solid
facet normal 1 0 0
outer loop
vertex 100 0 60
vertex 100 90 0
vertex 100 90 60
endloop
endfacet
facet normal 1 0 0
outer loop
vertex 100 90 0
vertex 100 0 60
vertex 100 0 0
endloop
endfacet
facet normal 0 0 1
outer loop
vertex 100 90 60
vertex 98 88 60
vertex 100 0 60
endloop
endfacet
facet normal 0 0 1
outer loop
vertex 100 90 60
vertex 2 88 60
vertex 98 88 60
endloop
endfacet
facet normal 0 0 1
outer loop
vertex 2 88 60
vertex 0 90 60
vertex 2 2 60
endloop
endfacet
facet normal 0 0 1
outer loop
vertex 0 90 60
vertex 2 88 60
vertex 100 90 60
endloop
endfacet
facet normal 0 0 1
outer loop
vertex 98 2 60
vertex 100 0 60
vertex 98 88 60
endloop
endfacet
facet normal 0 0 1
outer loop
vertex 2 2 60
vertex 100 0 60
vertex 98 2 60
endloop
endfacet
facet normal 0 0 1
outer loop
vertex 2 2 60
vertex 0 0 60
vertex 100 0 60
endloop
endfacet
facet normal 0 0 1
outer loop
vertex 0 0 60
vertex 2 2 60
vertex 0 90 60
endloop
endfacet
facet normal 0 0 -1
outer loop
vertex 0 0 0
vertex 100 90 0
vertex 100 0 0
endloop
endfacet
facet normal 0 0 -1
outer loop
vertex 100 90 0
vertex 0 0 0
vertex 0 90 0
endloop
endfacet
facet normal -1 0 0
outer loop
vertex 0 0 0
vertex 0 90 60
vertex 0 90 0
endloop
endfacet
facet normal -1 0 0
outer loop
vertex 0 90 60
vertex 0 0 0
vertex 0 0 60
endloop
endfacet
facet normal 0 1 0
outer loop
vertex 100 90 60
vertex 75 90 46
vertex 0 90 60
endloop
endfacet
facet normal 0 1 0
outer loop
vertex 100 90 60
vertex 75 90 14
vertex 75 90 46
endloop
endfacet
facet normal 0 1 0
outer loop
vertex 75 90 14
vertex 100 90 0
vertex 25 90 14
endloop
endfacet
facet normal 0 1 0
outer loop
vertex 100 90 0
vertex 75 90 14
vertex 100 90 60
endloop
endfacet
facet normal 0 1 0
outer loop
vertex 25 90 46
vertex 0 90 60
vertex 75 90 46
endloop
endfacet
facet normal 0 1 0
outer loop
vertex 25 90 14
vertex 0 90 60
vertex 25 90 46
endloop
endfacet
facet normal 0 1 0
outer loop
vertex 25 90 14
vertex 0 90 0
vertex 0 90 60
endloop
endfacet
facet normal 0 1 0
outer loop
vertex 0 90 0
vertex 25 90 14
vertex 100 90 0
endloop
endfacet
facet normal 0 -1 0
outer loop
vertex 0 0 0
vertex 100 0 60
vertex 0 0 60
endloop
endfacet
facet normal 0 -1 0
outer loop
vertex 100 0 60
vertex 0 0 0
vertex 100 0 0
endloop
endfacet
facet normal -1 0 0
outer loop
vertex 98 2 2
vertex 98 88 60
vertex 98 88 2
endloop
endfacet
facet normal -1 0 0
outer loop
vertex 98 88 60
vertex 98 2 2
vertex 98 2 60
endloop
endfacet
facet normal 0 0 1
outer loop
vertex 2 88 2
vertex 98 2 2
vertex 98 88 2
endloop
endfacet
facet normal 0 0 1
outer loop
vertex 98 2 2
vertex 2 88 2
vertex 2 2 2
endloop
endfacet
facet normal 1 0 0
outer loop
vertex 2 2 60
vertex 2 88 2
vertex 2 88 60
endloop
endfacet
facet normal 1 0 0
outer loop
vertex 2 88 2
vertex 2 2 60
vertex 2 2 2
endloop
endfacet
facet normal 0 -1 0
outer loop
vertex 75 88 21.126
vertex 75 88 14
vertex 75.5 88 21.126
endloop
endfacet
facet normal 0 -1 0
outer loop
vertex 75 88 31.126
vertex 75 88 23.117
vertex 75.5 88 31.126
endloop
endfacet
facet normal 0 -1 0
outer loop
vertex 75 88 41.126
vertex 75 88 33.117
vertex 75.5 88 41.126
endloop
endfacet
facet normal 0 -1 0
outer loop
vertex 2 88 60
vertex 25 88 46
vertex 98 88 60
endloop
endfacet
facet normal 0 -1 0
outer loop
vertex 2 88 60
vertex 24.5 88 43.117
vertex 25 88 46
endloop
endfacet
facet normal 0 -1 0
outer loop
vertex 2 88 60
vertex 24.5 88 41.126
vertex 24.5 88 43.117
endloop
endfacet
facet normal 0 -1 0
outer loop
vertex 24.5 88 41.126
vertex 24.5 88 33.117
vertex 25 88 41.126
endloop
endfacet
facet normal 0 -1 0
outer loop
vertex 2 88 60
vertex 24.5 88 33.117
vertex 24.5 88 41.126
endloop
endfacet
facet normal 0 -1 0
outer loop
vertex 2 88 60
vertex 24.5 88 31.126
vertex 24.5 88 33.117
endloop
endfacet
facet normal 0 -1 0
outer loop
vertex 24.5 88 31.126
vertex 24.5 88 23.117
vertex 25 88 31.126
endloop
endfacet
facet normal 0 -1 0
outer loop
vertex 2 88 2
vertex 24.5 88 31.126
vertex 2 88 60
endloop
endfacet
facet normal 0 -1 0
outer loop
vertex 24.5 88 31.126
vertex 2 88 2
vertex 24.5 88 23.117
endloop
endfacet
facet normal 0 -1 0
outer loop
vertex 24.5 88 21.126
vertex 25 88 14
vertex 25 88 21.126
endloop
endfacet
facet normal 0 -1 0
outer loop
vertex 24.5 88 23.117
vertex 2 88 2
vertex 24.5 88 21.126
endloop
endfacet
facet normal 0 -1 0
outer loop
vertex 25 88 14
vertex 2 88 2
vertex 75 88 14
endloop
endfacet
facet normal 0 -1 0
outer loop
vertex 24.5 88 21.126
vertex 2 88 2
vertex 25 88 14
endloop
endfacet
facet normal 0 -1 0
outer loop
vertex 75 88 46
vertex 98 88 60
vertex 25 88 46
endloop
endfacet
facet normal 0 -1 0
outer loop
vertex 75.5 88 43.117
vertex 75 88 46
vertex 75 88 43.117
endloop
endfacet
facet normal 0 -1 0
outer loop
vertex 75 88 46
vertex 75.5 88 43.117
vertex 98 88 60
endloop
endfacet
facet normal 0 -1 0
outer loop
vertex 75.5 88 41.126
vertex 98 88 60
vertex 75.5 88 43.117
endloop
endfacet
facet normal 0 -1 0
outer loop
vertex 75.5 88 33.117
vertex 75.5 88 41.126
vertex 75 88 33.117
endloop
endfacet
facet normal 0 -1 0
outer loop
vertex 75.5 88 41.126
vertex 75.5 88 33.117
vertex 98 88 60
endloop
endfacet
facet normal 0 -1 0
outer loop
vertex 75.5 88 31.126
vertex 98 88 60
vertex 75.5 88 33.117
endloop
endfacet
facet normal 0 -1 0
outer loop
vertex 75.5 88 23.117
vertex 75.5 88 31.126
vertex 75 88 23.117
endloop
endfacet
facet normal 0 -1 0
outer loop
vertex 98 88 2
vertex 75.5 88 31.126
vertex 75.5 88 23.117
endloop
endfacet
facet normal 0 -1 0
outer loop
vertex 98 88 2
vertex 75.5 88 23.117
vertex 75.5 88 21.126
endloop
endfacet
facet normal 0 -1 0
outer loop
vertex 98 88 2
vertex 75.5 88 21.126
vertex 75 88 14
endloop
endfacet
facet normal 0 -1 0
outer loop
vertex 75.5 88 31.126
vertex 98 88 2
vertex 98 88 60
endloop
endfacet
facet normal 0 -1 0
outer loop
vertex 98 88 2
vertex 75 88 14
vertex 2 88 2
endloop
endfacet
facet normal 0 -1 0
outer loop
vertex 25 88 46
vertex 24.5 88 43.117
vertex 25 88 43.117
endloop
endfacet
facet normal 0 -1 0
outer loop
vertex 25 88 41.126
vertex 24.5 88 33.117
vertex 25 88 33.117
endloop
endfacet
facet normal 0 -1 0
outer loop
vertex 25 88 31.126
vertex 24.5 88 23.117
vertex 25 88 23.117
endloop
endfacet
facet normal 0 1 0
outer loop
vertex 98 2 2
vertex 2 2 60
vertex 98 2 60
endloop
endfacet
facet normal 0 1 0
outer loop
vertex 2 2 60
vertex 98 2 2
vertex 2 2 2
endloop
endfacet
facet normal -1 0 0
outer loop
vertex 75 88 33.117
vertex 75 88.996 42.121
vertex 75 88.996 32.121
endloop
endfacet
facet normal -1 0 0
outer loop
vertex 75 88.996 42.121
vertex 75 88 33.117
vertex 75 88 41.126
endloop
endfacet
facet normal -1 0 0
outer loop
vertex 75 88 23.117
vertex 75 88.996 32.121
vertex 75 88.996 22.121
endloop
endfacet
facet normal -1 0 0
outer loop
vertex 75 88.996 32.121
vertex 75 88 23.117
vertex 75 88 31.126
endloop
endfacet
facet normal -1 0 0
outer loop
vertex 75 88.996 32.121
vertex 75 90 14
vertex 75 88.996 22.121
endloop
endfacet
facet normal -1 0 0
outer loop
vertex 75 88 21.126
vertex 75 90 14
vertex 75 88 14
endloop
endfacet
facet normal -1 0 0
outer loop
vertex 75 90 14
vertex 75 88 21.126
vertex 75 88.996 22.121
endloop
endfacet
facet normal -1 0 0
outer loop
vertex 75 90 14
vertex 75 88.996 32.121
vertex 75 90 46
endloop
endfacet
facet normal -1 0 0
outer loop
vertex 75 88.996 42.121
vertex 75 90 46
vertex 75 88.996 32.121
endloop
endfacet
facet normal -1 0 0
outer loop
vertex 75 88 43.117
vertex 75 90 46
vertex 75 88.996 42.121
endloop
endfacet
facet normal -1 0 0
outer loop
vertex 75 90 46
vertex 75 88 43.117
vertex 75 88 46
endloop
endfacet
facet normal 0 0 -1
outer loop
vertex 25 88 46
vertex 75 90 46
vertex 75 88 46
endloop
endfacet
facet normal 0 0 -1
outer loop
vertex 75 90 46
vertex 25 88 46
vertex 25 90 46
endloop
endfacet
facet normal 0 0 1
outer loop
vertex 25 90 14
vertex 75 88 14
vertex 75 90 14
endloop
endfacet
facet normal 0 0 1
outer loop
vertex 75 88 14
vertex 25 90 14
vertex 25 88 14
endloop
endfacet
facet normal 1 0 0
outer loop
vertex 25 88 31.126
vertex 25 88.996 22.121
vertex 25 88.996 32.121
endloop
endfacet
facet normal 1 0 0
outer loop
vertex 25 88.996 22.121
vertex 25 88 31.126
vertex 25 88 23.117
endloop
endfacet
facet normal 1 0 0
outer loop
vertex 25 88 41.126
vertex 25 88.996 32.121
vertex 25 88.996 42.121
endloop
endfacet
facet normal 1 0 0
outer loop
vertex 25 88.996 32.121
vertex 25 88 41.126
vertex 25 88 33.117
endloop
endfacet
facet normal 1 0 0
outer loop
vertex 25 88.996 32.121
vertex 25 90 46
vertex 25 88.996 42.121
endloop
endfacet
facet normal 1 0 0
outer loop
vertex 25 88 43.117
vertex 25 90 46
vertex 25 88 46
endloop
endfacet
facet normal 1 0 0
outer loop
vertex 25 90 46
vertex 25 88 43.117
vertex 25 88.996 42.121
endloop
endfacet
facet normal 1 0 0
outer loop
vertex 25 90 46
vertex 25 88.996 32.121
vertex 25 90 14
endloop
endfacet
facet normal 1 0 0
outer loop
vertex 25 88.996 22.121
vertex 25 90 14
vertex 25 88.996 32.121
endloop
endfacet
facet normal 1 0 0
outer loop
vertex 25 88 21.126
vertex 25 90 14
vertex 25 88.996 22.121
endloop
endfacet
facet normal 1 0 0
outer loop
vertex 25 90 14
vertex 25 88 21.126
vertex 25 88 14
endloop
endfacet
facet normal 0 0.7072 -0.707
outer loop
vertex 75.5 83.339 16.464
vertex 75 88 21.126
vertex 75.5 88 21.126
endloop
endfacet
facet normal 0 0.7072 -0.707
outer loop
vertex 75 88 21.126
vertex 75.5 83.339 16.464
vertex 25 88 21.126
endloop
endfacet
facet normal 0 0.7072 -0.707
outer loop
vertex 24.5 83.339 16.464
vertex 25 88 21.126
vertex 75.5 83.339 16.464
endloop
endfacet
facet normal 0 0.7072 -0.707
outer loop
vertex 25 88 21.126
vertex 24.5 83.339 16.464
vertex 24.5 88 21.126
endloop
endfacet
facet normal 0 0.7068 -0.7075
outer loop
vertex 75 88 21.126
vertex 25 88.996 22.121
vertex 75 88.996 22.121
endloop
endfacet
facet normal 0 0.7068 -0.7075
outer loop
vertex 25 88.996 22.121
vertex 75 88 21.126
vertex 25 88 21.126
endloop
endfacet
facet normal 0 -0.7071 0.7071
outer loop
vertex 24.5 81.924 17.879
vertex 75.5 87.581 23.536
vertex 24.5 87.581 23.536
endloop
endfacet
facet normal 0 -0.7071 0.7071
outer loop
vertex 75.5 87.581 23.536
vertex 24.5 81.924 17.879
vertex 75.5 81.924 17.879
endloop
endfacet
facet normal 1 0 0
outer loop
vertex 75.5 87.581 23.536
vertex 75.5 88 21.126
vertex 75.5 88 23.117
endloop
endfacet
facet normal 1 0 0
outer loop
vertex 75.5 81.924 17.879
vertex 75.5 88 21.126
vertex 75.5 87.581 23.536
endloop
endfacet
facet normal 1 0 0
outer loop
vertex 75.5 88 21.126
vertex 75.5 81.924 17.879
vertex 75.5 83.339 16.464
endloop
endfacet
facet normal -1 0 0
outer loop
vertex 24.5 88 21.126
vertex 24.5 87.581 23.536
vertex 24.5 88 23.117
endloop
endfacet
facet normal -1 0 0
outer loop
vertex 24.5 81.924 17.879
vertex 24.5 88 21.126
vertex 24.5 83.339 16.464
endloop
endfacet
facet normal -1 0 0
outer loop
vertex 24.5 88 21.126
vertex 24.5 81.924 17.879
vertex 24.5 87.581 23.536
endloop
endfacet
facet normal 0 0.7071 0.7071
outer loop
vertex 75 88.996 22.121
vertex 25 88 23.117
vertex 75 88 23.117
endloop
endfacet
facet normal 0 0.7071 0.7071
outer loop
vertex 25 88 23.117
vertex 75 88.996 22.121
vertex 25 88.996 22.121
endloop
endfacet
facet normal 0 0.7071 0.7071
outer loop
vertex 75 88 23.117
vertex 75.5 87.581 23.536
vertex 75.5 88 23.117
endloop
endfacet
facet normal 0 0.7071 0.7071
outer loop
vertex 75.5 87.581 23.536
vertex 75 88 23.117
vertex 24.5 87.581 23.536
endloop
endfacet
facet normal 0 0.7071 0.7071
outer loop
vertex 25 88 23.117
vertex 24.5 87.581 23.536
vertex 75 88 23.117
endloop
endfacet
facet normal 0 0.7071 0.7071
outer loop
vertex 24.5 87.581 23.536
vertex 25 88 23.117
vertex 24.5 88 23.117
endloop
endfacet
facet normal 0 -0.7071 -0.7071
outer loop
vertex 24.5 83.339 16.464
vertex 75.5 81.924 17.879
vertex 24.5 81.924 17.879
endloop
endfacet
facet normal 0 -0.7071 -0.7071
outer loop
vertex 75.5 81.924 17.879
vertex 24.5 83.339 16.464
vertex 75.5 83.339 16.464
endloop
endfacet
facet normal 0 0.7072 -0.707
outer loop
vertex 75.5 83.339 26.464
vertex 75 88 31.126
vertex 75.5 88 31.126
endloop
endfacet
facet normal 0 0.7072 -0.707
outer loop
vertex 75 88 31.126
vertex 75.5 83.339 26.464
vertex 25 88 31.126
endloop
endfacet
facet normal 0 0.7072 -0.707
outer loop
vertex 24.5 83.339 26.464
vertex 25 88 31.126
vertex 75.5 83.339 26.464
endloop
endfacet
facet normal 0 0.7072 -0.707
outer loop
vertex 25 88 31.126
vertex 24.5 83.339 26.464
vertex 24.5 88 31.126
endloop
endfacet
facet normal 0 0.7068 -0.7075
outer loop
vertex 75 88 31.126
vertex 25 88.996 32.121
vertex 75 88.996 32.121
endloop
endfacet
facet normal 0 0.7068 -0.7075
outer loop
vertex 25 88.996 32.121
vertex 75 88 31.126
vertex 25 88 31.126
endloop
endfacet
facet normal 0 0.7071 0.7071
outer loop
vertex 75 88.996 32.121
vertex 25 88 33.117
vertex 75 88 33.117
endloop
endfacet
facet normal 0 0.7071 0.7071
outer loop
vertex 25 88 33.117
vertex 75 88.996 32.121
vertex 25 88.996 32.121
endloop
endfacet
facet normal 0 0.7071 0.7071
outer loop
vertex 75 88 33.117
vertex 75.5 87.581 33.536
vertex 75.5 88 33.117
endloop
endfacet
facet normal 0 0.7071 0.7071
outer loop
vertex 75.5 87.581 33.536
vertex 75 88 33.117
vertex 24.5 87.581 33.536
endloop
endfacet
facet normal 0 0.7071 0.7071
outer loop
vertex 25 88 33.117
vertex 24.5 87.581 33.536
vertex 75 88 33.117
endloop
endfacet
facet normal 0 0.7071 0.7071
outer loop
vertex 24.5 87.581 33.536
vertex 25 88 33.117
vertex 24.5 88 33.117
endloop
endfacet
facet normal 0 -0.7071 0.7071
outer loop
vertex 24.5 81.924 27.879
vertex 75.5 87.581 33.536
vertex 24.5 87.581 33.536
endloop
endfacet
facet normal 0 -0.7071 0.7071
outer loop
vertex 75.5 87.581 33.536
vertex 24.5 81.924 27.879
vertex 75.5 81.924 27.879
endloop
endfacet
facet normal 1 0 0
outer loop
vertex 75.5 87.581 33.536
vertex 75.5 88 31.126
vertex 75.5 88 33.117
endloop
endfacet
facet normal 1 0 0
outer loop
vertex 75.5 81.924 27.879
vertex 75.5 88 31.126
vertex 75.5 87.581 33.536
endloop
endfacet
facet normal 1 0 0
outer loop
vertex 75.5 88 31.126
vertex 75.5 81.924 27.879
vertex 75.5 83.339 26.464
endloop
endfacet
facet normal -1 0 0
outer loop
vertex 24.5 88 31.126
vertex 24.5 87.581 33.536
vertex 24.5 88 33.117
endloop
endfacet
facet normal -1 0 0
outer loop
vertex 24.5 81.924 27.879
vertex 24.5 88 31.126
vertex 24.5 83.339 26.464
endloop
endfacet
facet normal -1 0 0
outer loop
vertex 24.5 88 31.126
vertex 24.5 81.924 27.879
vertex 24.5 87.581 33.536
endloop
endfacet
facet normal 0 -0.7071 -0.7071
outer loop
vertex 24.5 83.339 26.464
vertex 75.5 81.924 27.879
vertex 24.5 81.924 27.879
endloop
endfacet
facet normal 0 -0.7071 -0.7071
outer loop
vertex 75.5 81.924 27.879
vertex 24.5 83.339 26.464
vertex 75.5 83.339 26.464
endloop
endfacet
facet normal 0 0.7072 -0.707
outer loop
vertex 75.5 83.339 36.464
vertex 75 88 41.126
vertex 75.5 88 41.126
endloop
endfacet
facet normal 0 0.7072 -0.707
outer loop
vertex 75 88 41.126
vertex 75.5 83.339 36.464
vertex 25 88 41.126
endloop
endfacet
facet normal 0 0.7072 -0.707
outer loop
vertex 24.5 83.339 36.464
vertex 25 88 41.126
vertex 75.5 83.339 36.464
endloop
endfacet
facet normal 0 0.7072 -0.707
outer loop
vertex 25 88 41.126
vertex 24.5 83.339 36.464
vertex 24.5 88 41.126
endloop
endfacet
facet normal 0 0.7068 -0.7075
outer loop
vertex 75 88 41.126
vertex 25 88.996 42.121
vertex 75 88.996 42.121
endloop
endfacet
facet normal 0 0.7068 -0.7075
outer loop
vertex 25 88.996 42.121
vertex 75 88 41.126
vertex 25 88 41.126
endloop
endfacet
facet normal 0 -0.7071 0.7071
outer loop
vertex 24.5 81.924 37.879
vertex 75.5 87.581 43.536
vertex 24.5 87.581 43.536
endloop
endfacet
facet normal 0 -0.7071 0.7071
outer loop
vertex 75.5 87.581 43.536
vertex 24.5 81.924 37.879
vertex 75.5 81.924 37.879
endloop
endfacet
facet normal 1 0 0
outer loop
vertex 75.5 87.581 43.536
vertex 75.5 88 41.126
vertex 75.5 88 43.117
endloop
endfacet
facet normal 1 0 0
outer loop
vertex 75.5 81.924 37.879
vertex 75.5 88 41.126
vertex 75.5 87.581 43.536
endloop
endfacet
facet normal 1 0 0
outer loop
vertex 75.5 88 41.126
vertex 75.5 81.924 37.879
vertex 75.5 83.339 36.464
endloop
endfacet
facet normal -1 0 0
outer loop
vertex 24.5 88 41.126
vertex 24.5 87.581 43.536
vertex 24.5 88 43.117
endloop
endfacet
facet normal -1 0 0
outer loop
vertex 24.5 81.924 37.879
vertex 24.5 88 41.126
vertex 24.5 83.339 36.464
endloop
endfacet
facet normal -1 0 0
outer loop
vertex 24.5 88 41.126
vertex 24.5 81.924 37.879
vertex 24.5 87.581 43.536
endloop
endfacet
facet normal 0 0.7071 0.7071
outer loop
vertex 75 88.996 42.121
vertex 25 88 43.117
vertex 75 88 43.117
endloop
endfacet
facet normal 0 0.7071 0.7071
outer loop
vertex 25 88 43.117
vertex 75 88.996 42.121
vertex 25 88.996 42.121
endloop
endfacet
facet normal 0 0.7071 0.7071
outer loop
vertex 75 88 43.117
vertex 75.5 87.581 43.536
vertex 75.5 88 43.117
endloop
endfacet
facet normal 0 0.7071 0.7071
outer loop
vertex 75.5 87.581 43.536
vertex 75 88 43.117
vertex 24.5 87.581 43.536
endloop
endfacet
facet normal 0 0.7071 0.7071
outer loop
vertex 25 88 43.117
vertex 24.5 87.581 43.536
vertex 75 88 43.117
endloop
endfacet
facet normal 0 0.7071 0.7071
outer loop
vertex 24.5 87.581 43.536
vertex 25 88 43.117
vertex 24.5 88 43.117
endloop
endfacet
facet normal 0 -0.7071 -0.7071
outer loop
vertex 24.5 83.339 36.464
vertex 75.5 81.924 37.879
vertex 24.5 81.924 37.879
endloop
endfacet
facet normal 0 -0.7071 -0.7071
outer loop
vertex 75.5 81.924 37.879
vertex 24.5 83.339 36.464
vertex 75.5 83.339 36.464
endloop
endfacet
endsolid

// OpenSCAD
$fn = 32;

// ----------------------------------------------------------------------
// Vent box: louvers enclosure
// ----------------------------------------------------------------------

// --- parameters (mm) ---
box_l = 100;              // box length, X
box_w = 90;               // box width, Y
box_h = 60;               // box height, Z
wall_t = 2;               // shell wall thickness
win_l = 50;               // vent window width, X
win_h = 32;               // vent window height, Z
slat_t = 2;               // louver slat thickness
slat_d = 8;               // louver slat depth
slat_a = 45;              // louver slat angle, degrees
slat_pitch = 10;          // louver pitch
slat_yc = 85.46;          // slat centreline Y

win_z0 = (box_h - win_h) / 2;  // window lower edge Z
n_slats = 3;  // louver count
slat_z0 = win_z0 + (win_h - (n_slats - 1) * slat_pitch) / 2;

difference() {
  union() {
    difference() {
      cube([box_l, box_w, box_h]);
  translate([wall_t, wall_t, wall_t])
    cube([box_l - 2 * wall_t, box_w - 2 * wall_t, box_h]);
  translate([(box_l - win_l) / 2, box_w - wall_t - 1, win_z0])
    cube([win_l, wall_t + 2, win_h]);
    }
    for (i = [0 : n_slats - 1])
      translate([box_l / 2, slat_yc, slat_z0 + i * slat_pitch])
        rotate([slat_a, 0, 0])
          cube([win_l + 1, slat_d, slat_t], center = true);
  }
}
